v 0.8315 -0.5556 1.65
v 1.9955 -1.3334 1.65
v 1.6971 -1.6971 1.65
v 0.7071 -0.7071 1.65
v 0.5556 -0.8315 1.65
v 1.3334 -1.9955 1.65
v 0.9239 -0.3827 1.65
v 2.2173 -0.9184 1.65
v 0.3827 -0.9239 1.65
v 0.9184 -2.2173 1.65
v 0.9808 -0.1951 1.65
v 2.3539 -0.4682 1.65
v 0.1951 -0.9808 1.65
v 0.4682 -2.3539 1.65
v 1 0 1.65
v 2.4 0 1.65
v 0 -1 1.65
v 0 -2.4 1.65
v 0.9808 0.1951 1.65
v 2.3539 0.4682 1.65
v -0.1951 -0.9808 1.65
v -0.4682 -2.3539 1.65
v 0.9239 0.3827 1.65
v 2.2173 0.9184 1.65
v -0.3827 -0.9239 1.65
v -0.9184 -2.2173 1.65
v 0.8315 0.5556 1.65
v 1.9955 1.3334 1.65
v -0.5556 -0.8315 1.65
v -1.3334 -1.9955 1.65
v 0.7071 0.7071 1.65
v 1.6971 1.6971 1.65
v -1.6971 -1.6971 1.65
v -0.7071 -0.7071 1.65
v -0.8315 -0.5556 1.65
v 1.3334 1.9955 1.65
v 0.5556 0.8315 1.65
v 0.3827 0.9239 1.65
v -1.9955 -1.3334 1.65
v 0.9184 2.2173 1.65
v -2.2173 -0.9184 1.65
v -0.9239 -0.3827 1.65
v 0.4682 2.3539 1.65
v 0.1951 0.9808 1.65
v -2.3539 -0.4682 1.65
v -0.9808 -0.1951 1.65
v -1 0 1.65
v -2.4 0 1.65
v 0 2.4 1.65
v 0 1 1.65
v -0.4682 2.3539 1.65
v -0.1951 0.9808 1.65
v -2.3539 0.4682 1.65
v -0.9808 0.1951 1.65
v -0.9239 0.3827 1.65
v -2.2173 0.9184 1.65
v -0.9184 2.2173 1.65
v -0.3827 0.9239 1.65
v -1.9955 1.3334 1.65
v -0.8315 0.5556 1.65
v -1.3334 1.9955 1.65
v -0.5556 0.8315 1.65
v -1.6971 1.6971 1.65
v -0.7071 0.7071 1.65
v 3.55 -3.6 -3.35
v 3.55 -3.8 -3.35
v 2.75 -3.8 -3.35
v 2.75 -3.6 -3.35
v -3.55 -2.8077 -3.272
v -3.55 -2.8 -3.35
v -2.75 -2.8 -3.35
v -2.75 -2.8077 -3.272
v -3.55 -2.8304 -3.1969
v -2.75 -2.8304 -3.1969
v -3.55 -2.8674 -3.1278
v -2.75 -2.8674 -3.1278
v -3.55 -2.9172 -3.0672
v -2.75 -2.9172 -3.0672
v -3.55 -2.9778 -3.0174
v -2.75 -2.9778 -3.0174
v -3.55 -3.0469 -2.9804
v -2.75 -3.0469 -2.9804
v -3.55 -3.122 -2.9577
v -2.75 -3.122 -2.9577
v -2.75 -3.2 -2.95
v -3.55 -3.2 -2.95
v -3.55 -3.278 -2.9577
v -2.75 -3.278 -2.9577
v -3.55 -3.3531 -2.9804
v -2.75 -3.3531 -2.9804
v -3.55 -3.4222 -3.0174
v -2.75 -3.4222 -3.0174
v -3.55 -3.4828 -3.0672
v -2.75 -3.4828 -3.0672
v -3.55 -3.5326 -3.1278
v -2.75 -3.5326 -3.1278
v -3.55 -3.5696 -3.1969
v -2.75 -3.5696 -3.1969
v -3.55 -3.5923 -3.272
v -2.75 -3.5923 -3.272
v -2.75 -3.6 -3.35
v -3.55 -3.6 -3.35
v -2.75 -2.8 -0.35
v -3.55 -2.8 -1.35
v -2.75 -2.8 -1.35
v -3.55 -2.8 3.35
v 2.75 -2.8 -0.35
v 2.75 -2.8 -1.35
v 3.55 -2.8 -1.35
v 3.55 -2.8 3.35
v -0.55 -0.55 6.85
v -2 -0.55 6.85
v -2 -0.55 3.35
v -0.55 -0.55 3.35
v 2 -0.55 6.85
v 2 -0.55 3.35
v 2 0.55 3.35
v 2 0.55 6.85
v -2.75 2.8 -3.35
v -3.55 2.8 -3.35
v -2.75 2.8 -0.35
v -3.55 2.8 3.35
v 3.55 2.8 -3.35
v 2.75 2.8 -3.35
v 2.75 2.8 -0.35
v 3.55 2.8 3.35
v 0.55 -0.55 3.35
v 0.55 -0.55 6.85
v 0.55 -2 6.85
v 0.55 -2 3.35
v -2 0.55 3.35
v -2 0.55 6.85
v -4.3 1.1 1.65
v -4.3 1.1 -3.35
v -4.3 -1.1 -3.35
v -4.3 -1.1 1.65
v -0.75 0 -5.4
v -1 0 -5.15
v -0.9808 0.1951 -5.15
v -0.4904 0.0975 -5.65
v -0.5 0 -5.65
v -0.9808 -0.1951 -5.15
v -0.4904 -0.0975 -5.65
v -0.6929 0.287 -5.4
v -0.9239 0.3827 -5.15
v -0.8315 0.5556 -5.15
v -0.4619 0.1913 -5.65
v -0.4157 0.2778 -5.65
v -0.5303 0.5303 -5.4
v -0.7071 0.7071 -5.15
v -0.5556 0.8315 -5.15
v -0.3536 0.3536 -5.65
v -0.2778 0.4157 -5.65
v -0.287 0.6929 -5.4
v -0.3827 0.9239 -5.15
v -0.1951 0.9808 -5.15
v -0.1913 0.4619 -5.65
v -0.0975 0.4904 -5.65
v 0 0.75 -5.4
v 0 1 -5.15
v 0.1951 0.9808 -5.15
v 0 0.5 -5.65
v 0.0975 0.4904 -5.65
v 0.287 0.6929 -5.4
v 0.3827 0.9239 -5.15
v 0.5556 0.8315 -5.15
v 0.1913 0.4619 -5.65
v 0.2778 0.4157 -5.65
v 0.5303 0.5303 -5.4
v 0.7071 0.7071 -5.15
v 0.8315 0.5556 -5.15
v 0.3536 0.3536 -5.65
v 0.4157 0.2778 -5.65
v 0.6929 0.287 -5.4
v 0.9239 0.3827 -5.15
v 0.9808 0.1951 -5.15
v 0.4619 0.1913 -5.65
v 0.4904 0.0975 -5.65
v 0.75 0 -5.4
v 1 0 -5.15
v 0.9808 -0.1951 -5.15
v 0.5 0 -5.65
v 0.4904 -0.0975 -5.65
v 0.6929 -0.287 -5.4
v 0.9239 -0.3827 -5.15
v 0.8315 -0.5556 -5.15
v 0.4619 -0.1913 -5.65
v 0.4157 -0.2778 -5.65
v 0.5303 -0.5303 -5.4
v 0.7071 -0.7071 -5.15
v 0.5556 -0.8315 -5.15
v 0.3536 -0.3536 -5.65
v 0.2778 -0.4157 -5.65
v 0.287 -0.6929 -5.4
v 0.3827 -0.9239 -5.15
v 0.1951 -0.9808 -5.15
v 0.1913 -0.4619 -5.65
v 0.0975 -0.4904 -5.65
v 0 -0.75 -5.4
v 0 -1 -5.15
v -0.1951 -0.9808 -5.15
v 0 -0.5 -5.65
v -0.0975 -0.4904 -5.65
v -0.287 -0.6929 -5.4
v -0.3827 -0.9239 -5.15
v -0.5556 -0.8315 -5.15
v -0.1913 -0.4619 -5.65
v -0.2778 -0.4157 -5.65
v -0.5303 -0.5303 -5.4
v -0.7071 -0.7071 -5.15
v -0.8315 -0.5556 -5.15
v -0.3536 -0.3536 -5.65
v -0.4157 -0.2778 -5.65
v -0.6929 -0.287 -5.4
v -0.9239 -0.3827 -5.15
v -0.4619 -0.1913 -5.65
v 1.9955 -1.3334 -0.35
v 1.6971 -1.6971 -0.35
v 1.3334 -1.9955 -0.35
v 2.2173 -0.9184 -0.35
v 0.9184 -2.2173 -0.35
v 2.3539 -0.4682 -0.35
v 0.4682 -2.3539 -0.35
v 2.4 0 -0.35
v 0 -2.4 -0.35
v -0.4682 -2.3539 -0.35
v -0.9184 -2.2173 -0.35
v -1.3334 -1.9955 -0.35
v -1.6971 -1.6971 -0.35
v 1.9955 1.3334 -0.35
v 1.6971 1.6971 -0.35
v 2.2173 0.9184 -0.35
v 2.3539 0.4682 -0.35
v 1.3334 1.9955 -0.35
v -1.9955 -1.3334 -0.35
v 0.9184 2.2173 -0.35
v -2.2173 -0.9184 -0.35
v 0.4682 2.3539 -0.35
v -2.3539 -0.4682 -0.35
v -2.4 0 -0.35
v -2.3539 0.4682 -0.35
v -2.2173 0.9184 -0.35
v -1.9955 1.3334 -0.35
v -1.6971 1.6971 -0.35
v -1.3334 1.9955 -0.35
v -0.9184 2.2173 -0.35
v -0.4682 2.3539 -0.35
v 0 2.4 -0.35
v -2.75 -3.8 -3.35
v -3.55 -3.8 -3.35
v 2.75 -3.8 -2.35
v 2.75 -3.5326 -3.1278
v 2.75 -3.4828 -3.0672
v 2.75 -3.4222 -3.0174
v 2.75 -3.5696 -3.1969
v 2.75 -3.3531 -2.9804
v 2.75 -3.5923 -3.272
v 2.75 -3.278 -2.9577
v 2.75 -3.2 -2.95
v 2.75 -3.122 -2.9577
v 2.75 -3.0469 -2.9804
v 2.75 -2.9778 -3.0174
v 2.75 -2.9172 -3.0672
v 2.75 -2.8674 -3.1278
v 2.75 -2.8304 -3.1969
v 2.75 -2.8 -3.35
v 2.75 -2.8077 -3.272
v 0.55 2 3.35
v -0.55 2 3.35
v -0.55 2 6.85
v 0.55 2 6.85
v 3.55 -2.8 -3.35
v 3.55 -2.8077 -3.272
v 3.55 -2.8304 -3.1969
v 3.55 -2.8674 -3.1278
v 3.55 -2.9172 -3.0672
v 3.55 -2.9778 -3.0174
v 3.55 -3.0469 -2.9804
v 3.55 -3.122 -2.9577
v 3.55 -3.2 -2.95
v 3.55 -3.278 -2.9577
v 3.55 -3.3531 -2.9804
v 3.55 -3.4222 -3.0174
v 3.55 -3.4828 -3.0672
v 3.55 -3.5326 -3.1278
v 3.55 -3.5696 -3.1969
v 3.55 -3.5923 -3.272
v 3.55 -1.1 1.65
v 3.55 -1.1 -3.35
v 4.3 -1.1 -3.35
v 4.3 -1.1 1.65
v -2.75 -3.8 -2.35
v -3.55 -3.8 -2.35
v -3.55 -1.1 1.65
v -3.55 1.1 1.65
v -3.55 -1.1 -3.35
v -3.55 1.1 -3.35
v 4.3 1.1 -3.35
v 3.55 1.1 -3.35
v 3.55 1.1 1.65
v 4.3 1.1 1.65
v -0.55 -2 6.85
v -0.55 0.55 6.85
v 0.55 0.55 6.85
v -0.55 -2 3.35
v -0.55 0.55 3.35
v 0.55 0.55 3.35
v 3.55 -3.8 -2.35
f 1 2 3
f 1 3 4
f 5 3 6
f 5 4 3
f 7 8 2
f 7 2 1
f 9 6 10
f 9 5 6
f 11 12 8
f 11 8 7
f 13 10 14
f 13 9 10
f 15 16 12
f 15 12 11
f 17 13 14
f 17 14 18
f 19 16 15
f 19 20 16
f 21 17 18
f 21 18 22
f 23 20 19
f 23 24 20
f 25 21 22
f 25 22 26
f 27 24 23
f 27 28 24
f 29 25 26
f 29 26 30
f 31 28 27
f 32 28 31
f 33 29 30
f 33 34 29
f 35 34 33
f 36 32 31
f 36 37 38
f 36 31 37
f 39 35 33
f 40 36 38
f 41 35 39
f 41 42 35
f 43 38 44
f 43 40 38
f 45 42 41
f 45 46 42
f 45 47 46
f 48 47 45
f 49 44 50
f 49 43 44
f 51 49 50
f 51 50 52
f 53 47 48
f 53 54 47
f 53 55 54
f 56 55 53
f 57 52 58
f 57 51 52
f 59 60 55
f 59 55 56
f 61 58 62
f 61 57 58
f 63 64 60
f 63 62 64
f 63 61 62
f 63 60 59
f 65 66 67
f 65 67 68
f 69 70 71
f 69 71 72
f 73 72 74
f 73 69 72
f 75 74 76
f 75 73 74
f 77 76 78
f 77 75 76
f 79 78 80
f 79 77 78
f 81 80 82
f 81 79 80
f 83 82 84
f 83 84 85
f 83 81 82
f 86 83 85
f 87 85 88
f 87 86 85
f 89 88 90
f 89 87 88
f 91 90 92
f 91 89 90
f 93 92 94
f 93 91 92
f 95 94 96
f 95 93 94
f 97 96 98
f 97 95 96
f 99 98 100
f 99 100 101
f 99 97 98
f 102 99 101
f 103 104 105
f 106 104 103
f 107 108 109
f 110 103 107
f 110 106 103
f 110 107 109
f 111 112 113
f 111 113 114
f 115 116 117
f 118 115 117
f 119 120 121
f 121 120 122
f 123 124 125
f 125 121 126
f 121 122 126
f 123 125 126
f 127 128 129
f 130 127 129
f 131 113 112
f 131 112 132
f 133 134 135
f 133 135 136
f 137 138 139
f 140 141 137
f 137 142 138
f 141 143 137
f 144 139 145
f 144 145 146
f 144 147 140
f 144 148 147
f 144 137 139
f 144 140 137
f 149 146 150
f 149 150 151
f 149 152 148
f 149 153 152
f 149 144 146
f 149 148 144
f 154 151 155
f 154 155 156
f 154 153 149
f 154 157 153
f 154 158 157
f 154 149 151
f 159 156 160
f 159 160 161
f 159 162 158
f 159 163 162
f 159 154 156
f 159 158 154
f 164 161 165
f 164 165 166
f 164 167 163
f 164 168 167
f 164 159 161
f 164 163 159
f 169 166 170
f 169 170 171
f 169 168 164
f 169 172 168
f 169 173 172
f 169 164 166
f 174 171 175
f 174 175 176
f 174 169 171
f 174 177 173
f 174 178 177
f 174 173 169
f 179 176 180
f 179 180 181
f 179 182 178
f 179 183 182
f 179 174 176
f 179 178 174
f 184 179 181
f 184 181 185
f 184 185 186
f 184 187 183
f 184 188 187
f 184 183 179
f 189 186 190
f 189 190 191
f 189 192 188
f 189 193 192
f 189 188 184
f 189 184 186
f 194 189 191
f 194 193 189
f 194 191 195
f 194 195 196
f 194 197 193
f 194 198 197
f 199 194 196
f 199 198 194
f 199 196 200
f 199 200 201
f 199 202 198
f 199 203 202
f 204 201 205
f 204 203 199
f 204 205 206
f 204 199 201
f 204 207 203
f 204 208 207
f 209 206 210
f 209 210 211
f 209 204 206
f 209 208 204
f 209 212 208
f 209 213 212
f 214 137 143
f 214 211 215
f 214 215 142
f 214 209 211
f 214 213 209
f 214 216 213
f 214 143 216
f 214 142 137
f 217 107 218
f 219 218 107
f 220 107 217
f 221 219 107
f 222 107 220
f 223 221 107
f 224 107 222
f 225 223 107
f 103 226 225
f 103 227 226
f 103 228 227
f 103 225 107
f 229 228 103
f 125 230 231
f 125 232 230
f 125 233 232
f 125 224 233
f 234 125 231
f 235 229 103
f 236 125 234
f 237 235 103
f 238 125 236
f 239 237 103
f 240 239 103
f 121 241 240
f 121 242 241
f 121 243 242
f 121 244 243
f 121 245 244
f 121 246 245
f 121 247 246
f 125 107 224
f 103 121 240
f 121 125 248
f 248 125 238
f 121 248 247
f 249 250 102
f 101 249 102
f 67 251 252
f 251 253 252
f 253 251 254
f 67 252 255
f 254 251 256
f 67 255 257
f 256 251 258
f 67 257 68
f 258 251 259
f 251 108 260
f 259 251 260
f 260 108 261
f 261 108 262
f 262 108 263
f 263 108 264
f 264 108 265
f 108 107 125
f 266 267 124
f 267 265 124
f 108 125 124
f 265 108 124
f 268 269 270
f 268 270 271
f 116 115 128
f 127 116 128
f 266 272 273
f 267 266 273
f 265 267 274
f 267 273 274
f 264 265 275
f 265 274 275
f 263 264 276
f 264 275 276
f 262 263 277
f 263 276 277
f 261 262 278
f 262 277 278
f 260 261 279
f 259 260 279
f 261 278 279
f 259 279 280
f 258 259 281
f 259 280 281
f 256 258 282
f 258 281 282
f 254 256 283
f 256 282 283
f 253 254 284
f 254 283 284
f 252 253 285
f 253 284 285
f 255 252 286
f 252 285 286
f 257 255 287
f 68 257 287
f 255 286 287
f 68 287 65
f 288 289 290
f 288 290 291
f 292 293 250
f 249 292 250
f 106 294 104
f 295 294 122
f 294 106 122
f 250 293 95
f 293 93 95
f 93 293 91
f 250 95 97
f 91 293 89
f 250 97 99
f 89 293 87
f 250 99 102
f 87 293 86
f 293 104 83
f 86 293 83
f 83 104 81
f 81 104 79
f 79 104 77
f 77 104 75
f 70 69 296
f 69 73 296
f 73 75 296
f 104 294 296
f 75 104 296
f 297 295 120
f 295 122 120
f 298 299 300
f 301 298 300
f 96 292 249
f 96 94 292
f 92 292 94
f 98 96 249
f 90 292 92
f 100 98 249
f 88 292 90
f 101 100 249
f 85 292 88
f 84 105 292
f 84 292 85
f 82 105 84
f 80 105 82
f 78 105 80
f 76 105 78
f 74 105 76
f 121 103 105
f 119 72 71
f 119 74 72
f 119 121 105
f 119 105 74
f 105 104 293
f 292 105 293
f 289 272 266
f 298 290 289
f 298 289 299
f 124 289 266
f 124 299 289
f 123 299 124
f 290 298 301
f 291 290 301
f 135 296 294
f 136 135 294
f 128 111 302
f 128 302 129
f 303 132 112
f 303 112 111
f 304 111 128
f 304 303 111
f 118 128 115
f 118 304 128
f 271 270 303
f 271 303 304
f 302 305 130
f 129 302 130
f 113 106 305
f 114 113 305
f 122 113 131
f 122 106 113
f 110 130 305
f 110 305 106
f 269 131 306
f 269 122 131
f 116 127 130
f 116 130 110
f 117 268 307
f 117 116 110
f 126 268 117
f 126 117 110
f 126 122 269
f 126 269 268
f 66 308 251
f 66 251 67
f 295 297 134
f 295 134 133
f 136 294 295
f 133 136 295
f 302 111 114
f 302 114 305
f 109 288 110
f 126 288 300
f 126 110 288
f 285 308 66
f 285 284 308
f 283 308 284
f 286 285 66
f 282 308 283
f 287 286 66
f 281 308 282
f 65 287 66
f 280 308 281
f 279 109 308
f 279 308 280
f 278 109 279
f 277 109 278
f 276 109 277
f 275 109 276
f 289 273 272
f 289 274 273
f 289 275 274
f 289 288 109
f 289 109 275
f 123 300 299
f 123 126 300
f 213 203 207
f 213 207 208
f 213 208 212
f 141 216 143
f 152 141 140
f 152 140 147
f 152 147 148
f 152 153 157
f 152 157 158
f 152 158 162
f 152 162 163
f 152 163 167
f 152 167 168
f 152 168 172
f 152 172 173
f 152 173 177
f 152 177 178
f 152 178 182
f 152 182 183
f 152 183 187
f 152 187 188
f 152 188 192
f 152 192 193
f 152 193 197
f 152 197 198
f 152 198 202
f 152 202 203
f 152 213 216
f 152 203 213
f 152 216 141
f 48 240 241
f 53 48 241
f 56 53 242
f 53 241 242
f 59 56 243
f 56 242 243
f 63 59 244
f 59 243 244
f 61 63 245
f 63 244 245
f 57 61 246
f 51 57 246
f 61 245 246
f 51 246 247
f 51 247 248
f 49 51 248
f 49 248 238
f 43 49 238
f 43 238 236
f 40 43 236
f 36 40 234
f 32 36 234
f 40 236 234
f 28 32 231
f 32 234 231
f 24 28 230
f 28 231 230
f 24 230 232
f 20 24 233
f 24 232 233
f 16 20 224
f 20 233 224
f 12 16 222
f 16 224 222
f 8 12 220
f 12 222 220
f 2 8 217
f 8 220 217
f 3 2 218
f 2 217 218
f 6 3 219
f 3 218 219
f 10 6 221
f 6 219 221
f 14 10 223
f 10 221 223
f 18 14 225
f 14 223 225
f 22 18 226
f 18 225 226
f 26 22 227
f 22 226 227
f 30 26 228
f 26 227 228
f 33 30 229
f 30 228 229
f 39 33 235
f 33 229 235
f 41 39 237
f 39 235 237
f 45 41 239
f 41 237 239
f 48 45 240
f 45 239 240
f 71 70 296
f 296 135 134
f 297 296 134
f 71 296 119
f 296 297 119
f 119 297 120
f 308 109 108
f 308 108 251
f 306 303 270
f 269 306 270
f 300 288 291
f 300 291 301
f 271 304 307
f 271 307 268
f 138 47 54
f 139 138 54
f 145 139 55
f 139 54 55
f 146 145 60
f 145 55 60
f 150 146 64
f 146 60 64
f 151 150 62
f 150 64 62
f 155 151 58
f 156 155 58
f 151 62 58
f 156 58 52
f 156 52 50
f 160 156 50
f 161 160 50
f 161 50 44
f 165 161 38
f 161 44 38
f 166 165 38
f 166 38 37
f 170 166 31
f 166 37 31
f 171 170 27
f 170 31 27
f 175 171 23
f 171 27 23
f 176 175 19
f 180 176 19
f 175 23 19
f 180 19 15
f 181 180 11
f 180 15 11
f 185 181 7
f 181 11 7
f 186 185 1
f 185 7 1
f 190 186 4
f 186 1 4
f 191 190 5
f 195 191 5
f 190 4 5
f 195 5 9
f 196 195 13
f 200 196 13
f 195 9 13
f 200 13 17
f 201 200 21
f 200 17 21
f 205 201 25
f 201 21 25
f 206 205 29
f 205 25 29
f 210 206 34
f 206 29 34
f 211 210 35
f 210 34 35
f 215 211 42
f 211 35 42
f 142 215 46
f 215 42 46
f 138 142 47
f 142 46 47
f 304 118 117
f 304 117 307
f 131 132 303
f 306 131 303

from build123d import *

# Parameters (mm, degrees)
SKETCH1_W               = 7.1
SKETCH1_H               = 5.6
BOSS_EXTRUDE1_DEPTH     = 3.35
SKETCH2_W               = 4
SKETCH2_H               = 4
BOSS_EXTRUDE2_DEPTH     = 3.5
SKETCH3_W               = 1.45
SKETCH3_H               = 1.45
CUT_EXTRUDE1_DEPTH      = 3.5
MIRROR2_COPY_1_SKETCH_W = 1.45
MIRROR2_COPY_1_SKETCH_H = 1.45
MIRROR2_COPY_1_DEPTH    = 3.5
SKETCH4_W               = 5
SKETCH4_H               = 2.2
BOSS_EXTRUDE3_DEPTH     = 0.75
SKETCH5_W               = 5.5
SKETCH5_H               = 5.6
CUT_EXTRUDE2_DEPTH      = 3
SKETCH6_R               = 2.4
CUT_EXTRUDE3_DEPTH      = 2
SKETCH7_R               = 1
BOSS_EXTRUDE4_DEPTH     = 7.3
CHAMFER1_SIZE           = 0.5
BOSS_EXTRUDE5_DEPTH     = 0.8
SKETCH9_R               = 0.4
CUT_EXTRUDE4_DEPTH      = 0.8


with BuildPart() as part:
    # Sketch1 → Boss-Extrude1 (new, symmetric)
    with BuildSketch(Plane.XY):
        Rectangle(SKETCH1_W, SKETCH1_H)
    extrude(amount=BOSS_EXTRUDE1_DEPTH, both=True)

    # Sketch2 → Boss-Extrude2 (add)
    with BuildSketch(Plane.XY.offset(3.35)):
        Rectangle(SKETCH2_W, SKETCH2_H)
    extrude(amount=BOSS_EXTRUDE2_DEPTH)

    # Sketch3 → Cut-Extrude1 (cut)
    with BuildSketch(Plane.XY.offset(6.85)):
        with Locations((-1.275, 1.275)):
            Rectangle(SKETCH3_W, SKETCH3_H)
    cut_extrude1 = extrude(amount=-CUT_EXTRUDE1_DEPTH, mode=Mode.SUBTRACT)

    # Mirror1: Cut-Extrude1 across plane
    add(cut_extrude1.mirror(Plane(origin=(0, 0, 0), x_dir=(0, 0, 1), z_dir=(1, 0, 0))), mode=Mode.SUBTRACT)

    # Mirror2: Cut-Extrude1 across plane
    add(cut_extrude1.mirror(Plane.ZX), mode=Mode.SUBTRACT)

    # Mirror2 copy 1 sketch → Mirror2 copy 1 (cut)
    with BuildSketch(Plane(origin=(0, 0, 6.85), x_dir=(-1, 0, 0), z_dir=(0, 0, 1))):
        with Locations((-1.275, 1.275)):
            Rectangle(MIRROR2_COPY_1_SKETCH_W, MIRROR2_COPY_1_SKETCH_H)
    extrude(amount=-MIRROR2_COPY_1_DEPTH, mode=Mode.SUBTRACT)

    # Sketch4 → Boss-Extrude3 (add)
    with BuildSketch(Plane.ZY.offset(3.55)):
        with Locations((-0.85, 0)):
            Rectangle(SKETCH4_W, SKETCH4_H)
    boss_extrude3 = extrude(amount=BOSS_EXTRUDE3_DEPTH)

    # Mirror3: Boss-Extrude3 across plane
    add(boss_extrude3.mirror(Plane(origin=(0, 0, 0), x_dir=(0, 0, 1), z_dir=(1, 0, 0))))

    # Sketch5 → Cut-Extrude2 (cut)
    with BuildSketch(Plane(origin=(0, 0, -3.35), x_dir=(-1, 0, 0), z_dir=(0, 0, -1))):
        Rectangle(SKETCH5_W, SKETCH5_H)
    extrude(amount=-CUT_EXTRUDE2_DEPTH, mode=Mode.SUBTRACT)

    # Sketch6 → Cut-Extrude3 (cut)
    with BuildSketch(Plane(origin=(0, 0, -0.35), x_dir=(-1, 0, 0), z_dir=(0, 0, -1))):
        Circle(SKETCH6_R)
    extrude(amount=-CUT_EXTRUDE3_DEPTH, mode=Mode.SUBTRACT)

    # Sketch7 → Boss-Extrude4 (add)
    with BuildSketch(Plane(origin=(0, 0, 1.65), x_dir=(-1, 0, 0), z_dir=(0, 0, -1))):
        Circle(SKETCH7_R)
    extrude(amount=BOSS_EXTRUDE4_DEPTH)

    # Chamfer1
    chamfer1_edges = [part.edges().sort_by_distance(p)[0] for p in [
        (1, 0, -5.65),
    ]]
    chamfer(chamfer1_edges, length=CHAMFER1_SIZE)

    # Sketch8 → Boss-Extrude5 (add)
    with BuildSketch(Plane(origin=(3.55, 0, 0), x_dir=(0, 0, -1), z_dir=(1, 0, 0))):
        Polygon((1.35, -2.8), (2.35, -3.8), (3.35, -3.8), (3.35, -2.8), align=None)
    boss_extrude5 = extrude(amount=-BOSS_EXTRUDE5_DEPTH)

    # Sketch9 → Cut-Extrude4 (cut)
    with BuildSketch(Plane(origin=(3.55, 0, 0), x_dir=(0, 0, -1), z_dir=(1, 0, 0))):
        with Locations((3.35, -3.2)):
            Circle(SKETCH9_R)
    cut_extrude4 = extrude(amount=-CUT_EXTRUDE4_DEPTH, mode=Mode.SUBTRACT)

    # Mirror4: Boss-Extrude5, Cut-Extrude4 across plane
    add(boss_extrude5.mirror(Plane(origin=(0, 0, 0), x_dir=(0, 0, 1), z_dir=(1, 0, 0))))
    add(cut_extrude4.mirror(Plane(origin=(0, 0, 0), x_dir=(0, 0, 1), z_dir=(1, 0, 0))), mode=Mode.SUBTRACT)


solid = part.part
